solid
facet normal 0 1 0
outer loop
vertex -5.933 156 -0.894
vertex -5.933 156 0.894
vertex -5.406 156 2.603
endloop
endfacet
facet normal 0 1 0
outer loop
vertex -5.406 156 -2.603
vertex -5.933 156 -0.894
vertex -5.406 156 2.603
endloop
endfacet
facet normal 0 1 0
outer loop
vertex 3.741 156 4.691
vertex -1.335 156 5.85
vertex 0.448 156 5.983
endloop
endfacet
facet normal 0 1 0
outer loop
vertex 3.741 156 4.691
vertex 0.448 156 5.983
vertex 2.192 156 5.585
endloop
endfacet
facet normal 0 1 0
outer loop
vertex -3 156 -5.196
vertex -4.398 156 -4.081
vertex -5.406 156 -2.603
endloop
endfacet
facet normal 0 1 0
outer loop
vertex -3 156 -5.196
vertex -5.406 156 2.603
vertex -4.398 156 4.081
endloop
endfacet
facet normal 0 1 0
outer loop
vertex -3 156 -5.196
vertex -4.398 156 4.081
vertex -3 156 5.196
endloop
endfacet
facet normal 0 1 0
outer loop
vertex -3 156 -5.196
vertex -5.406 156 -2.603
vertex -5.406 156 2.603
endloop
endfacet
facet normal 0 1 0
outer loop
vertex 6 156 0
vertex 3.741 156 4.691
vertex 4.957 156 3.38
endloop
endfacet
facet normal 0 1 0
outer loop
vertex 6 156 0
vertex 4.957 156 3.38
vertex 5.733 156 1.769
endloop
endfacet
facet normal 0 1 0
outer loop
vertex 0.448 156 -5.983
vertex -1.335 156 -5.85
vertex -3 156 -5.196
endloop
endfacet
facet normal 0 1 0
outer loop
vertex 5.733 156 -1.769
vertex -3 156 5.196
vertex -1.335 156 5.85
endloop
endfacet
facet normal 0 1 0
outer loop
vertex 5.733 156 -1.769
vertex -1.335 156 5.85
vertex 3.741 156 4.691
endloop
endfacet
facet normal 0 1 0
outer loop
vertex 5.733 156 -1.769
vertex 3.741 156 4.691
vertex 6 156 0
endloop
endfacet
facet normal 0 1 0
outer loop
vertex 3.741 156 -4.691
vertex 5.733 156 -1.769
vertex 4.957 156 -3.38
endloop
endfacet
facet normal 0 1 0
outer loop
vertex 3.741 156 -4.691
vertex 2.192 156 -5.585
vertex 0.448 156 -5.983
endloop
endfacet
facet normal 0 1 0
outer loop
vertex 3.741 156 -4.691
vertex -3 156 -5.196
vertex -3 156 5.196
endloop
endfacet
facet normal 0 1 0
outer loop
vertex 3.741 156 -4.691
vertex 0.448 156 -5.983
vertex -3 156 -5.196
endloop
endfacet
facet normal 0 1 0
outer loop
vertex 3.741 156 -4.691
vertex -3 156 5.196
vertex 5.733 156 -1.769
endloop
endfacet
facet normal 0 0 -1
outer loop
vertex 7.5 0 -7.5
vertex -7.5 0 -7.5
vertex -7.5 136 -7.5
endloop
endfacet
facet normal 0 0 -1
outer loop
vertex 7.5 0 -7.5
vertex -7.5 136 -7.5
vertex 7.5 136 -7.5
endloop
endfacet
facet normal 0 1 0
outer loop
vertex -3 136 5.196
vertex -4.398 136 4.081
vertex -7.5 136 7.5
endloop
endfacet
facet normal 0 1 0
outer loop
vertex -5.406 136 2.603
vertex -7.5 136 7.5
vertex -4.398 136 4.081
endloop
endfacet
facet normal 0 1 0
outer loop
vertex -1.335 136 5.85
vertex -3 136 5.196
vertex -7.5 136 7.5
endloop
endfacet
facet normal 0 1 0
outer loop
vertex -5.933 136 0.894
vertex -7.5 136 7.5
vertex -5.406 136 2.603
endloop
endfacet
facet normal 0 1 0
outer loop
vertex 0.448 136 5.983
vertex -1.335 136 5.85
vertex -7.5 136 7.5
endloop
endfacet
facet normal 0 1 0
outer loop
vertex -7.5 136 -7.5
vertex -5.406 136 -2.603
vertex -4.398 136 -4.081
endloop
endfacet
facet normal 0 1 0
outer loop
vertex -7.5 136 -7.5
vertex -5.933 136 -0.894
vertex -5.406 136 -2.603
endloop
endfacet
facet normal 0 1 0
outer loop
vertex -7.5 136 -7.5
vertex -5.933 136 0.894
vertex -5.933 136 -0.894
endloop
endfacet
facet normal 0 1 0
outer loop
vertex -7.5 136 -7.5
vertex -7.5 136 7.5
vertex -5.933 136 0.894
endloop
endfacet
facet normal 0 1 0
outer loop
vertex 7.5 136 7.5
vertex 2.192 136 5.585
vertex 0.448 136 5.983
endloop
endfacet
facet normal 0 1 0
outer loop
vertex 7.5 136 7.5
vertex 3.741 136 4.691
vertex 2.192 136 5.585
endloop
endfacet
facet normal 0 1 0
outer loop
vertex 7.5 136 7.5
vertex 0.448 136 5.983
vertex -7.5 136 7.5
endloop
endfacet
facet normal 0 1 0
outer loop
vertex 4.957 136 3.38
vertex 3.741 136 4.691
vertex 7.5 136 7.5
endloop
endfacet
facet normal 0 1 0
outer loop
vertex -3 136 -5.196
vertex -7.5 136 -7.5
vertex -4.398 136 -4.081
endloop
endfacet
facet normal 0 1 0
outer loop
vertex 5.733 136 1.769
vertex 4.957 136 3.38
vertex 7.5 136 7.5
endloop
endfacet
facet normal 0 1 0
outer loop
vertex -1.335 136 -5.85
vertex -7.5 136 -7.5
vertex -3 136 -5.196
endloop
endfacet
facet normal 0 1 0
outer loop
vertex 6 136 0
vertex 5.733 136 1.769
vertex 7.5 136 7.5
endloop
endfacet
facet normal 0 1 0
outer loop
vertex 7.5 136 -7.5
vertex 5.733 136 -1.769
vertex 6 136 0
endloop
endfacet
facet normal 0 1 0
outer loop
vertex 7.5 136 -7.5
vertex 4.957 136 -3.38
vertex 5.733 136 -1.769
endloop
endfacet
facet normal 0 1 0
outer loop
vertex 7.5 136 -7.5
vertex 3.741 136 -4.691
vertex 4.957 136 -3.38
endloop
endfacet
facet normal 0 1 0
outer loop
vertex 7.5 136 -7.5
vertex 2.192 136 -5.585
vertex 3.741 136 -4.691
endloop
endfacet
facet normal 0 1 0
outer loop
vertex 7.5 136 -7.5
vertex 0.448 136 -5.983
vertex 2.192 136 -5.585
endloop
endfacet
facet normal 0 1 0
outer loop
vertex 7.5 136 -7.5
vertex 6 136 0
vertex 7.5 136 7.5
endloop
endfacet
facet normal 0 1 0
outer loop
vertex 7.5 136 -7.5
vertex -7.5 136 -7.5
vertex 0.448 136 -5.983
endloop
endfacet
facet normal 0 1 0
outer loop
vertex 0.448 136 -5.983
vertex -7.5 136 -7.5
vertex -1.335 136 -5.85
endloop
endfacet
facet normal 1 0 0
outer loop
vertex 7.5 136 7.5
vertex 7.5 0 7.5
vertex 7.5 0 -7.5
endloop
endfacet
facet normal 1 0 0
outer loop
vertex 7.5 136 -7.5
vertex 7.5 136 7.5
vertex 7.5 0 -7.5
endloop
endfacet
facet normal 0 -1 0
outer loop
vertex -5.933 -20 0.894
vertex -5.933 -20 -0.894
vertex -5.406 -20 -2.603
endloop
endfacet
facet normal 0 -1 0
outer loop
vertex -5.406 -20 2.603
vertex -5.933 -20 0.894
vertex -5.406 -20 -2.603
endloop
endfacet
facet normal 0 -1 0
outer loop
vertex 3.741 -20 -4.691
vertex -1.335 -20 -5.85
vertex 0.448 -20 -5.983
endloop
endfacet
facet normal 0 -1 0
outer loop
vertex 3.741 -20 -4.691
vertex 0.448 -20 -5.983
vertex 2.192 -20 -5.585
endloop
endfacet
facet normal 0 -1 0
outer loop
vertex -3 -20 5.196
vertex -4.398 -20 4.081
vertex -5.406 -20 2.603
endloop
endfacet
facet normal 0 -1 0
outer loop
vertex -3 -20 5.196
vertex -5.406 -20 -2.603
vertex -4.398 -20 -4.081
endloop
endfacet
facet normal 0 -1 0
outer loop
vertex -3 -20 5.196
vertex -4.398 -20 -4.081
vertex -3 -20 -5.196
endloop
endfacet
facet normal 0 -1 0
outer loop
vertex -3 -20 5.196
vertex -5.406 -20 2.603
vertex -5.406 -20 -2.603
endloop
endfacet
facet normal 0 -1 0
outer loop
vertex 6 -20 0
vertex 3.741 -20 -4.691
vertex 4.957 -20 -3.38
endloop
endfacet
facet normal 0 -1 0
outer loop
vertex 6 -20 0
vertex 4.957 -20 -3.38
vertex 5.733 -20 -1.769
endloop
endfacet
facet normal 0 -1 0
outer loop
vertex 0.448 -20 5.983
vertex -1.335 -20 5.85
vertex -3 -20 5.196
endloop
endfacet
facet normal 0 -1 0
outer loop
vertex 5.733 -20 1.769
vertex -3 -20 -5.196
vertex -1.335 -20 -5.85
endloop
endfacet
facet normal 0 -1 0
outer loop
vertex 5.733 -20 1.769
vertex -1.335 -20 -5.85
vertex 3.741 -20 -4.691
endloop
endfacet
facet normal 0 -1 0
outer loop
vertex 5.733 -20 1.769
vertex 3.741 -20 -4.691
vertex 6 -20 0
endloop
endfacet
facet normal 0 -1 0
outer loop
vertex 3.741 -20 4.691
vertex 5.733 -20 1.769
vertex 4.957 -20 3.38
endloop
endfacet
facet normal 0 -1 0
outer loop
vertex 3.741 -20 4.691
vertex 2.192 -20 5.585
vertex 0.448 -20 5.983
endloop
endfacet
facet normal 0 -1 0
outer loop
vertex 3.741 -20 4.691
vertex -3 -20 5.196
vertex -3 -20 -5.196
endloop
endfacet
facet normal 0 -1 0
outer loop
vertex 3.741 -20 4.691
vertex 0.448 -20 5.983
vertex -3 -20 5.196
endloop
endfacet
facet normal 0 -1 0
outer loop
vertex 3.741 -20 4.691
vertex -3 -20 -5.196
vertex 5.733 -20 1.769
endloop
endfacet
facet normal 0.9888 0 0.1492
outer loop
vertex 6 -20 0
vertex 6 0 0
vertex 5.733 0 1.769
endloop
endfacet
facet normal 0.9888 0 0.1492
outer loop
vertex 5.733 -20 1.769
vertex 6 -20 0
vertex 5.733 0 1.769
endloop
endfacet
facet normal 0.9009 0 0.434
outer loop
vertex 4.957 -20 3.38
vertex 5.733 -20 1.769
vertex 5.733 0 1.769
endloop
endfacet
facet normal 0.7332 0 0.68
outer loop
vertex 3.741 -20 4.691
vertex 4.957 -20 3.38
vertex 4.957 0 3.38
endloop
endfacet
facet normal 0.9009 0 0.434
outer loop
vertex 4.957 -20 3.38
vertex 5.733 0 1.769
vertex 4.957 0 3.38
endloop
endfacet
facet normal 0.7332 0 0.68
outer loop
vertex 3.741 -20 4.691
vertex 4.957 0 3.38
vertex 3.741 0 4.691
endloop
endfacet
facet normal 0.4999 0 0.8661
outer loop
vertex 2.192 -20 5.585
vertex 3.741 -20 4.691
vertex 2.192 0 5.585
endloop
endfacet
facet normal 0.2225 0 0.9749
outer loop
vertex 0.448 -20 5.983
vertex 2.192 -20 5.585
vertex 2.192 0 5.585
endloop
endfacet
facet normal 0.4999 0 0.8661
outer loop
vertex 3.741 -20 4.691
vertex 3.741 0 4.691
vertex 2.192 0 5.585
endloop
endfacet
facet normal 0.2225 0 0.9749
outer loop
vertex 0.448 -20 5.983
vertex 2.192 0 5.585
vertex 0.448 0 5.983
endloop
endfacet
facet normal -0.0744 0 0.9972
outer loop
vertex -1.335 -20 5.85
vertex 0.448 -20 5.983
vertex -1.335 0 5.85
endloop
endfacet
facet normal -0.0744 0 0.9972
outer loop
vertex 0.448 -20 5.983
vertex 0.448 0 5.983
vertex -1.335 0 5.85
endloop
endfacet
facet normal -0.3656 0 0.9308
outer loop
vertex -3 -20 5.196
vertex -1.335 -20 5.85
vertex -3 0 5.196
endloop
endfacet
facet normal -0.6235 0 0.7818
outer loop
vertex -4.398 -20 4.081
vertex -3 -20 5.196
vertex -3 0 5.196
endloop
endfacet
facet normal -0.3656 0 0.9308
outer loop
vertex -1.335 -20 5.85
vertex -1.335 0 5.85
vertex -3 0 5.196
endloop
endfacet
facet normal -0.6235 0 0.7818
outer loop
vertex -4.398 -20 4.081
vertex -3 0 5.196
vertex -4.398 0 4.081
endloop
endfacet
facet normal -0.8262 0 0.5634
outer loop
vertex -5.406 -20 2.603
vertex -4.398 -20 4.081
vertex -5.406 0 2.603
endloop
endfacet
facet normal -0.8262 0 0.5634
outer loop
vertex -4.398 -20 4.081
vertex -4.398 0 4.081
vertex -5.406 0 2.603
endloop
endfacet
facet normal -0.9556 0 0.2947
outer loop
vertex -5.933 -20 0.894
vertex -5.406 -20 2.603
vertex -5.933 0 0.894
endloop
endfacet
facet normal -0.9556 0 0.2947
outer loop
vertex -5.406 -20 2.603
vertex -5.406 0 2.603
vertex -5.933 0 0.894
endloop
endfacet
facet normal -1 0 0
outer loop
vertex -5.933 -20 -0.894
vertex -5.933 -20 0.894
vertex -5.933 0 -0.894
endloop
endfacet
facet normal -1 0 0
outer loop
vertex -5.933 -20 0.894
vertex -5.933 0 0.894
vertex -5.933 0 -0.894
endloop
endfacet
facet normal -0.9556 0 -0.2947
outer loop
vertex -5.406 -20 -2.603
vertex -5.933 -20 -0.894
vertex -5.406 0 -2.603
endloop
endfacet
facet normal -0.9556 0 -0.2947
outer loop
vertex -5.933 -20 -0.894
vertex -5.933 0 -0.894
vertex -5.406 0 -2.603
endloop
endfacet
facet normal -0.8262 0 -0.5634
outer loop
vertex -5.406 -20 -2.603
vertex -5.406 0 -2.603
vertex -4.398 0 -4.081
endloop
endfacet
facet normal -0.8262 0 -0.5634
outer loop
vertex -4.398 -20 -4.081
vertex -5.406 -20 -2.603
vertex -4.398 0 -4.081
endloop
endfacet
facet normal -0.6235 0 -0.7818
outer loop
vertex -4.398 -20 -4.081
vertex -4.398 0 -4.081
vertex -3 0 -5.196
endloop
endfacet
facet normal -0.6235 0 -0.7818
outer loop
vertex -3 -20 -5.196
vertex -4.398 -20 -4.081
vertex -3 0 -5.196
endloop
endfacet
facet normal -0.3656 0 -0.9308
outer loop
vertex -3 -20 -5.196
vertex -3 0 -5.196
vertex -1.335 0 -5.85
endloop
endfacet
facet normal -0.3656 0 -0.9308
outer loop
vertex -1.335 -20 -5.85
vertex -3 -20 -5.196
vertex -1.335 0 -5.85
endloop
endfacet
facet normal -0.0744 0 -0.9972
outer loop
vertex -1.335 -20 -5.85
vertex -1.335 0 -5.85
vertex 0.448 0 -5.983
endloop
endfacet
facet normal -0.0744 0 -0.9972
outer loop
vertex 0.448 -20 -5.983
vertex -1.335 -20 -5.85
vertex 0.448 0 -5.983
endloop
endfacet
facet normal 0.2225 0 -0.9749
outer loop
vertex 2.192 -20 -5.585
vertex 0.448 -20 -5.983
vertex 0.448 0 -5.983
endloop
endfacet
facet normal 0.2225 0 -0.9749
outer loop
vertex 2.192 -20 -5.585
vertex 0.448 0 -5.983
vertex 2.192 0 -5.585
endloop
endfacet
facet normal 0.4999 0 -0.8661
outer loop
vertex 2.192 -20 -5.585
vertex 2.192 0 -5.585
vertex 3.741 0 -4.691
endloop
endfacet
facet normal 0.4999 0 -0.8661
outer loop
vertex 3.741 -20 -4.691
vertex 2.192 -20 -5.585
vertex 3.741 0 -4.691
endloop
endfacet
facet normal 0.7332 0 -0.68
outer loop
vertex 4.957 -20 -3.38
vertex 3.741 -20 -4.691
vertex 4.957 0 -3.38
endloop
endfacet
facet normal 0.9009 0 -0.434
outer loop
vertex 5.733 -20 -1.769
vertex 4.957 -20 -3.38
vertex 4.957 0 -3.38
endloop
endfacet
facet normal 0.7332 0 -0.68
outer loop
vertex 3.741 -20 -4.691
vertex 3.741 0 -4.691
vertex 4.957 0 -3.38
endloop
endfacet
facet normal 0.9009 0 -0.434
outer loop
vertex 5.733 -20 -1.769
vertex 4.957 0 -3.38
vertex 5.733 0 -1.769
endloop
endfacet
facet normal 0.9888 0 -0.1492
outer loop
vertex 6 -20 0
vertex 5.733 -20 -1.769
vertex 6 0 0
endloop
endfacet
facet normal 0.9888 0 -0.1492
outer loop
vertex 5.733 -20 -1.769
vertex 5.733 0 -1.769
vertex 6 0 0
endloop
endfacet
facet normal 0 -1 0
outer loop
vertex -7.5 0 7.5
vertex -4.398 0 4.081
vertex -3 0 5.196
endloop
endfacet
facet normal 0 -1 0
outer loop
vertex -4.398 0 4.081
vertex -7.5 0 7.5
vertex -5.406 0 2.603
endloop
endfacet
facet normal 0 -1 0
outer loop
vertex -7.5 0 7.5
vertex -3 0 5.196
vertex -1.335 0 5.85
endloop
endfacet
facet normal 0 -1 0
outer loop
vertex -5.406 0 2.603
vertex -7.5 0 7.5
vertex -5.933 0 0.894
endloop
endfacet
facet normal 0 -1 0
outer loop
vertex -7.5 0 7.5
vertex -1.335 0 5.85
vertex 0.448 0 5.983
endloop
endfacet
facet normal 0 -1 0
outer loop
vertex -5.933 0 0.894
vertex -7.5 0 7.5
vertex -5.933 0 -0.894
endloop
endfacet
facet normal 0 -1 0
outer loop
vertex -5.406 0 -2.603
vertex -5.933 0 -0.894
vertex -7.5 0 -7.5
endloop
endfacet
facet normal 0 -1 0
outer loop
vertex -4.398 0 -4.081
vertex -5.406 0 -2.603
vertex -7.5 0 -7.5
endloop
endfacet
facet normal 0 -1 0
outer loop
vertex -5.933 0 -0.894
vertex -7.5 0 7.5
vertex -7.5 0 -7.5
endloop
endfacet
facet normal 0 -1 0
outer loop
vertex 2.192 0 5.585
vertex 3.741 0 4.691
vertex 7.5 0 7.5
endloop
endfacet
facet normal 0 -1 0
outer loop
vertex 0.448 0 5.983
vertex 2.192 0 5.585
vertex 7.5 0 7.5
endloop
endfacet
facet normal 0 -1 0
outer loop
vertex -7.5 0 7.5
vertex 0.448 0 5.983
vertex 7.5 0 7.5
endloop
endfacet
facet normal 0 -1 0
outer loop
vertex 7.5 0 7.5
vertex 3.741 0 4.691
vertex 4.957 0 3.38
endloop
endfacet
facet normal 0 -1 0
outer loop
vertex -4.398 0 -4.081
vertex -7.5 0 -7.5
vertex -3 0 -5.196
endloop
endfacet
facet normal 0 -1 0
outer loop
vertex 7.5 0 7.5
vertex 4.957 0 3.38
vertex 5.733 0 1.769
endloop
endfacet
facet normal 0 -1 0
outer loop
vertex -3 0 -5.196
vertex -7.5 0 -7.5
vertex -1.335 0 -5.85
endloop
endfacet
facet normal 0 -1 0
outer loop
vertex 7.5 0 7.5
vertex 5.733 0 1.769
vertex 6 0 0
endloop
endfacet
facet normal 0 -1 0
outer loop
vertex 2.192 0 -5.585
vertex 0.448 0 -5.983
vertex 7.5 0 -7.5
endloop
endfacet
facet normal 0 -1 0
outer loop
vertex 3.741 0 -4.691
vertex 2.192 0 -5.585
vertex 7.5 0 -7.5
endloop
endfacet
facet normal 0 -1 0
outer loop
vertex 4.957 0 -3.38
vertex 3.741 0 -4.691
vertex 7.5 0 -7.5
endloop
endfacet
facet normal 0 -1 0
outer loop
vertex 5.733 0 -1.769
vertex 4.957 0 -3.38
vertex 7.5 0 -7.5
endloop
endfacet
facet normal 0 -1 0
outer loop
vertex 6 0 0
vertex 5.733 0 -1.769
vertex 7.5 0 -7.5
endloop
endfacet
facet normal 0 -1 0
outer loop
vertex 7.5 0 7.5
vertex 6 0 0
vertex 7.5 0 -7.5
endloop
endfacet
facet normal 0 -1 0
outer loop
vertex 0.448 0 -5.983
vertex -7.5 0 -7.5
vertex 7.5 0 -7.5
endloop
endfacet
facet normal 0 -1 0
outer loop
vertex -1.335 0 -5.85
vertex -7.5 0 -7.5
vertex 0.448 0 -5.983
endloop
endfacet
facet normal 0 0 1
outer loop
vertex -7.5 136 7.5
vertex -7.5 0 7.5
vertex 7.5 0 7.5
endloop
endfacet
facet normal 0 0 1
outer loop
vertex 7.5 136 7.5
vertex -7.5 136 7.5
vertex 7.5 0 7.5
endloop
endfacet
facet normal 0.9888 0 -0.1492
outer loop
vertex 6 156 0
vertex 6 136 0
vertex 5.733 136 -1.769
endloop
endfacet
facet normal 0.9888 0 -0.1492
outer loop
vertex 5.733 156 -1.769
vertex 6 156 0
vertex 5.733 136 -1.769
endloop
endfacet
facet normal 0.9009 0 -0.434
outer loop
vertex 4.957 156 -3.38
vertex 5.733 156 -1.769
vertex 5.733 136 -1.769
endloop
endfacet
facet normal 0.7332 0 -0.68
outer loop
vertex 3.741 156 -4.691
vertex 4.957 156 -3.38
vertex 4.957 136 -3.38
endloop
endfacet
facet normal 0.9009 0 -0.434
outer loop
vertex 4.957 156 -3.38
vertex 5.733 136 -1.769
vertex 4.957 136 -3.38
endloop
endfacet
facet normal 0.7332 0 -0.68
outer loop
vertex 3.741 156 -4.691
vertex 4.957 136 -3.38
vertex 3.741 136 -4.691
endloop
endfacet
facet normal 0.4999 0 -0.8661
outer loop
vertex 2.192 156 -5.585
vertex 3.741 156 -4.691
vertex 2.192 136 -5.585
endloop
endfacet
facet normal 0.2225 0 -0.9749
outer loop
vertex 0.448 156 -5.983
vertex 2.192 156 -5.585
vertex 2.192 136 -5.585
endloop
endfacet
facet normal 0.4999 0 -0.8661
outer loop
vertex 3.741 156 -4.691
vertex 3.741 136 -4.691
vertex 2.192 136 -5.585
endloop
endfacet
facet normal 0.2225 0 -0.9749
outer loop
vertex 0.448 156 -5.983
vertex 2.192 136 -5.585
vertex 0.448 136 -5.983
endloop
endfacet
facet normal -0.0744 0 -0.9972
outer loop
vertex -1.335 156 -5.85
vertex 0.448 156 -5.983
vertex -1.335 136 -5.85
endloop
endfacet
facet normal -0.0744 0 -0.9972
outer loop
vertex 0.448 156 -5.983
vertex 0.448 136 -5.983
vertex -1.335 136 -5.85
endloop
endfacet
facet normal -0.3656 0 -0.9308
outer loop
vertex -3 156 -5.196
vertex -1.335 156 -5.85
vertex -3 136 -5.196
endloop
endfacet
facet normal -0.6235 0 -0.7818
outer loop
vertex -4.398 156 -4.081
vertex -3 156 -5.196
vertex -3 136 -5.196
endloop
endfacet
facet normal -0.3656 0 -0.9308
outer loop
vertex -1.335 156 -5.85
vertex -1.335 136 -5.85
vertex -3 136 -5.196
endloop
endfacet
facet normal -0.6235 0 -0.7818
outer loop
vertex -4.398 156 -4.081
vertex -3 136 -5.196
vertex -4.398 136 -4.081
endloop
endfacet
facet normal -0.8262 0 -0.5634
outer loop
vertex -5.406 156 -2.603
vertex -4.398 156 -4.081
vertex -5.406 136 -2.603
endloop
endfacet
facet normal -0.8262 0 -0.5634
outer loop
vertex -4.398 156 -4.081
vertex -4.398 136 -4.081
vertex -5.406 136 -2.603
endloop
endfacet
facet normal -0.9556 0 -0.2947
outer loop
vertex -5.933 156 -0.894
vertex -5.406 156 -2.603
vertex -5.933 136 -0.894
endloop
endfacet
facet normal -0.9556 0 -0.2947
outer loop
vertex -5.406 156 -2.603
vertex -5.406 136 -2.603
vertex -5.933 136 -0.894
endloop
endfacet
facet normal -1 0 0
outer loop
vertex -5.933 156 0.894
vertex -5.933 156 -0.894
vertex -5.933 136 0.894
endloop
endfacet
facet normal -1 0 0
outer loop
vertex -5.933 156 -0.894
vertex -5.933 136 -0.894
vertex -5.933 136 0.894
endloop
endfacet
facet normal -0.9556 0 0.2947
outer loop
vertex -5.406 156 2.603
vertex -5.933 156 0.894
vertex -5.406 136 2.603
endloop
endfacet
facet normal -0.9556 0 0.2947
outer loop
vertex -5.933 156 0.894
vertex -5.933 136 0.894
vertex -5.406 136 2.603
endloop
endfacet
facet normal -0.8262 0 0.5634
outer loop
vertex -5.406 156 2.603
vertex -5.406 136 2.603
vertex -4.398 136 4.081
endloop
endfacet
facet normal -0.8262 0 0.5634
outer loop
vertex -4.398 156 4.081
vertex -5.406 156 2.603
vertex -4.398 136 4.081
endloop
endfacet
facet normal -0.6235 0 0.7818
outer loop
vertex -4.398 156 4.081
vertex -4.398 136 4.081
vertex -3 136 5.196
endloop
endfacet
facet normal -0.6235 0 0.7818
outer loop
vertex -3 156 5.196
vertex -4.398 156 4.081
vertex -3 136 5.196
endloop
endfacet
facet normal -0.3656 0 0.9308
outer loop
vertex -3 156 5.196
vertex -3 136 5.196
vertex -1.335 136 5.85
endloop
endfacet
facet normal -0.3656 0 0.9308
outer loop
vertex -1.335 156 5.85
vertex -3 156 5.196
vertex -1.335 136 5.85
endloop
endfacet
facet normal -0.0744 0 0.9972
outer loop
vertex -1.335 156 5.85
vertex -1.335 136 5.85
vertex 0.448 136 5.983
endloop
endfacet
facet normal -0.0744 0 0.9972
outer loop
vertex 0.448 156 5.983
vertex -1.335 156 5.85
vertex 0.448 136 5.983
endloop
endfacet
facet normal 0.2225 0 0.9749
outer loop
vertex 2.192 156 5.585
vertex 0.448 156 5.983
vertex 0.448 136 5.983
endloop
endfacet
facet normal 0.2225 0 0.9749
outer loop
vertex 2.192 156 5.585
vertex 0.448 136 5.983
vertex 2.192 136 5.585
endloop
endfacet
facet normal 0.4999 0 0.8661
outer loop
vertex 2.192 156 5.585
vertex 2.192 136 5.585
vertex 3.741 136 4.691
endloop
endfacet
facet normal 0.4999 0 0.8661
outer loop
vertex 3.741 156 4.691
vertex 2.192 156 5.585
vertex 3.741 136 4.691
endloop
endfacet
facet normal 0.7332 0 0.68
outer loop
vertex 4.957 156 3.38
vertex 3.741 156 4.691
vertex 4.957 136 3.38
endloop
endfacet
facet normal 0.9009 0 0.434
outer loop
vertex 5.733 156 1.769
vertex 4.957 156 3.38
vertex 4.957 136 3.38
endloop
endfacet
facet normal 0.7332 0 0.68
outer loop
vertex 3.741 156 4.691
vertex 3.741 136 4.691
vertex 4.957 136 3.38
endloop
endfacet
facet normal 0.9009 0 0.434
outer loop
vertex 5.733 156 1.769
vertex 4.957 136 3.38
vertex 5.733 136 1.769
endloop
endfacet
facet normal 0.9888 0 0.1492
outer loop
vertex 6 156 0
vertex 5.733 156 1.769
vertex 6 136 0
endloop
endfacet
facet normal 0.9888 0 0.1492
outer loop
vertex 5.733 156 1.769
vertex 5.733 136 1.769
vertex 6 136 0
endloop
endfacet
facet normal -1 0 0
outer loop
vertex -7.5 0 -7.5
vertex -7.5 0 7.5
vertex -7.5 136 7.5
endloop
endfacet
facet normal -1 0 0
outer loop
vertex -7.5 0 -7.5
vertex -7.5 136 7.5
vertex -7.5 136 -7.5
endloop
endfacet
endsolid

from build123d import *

# Parameters (mm, degrees)
SKETCH_1_W      = 15
SKETCH_1_H      = 15
EXTRUDE_1_DEPTH = 136
SKETCH_2_R      = 6
EXTRUDE_2_DEPTH = 20
SKETCH_3_R      = 6
EXTRUDE_3_DEPTH = 20


with BuildPart() as part:
    # 草图1 → 凸台-拉伸1 (new body)
    with BuildSketch(Plane(origin=(0, 0, 0), x_dir=(1, 0, 0), z_dir=(0, 1, 0))):
        Rectangle(SKETCH_1_W, SKETCH_1_H)
    extrude(amount=EXTRUDE_1_DEPTH)

    # 草图2 → 凸台-拉伸2 (add)
    with BuildSketch(Plane(origin=(0, 136, 0), x_dir=(1, 0, 0), z_dir=(0, 1, 0))):
        Circle(SKETCH_2_R)
    extrude(amount=EXTRUDE_2_DEPTH)

    # 草图3 → 凸台-拉伸3 (add)
    with BuildSketch(Plane.XZ):
        Circle(SKETCH_3_R)
    extrude(amount=EXTRUDE_3_DEPTH)


solid = part.part
